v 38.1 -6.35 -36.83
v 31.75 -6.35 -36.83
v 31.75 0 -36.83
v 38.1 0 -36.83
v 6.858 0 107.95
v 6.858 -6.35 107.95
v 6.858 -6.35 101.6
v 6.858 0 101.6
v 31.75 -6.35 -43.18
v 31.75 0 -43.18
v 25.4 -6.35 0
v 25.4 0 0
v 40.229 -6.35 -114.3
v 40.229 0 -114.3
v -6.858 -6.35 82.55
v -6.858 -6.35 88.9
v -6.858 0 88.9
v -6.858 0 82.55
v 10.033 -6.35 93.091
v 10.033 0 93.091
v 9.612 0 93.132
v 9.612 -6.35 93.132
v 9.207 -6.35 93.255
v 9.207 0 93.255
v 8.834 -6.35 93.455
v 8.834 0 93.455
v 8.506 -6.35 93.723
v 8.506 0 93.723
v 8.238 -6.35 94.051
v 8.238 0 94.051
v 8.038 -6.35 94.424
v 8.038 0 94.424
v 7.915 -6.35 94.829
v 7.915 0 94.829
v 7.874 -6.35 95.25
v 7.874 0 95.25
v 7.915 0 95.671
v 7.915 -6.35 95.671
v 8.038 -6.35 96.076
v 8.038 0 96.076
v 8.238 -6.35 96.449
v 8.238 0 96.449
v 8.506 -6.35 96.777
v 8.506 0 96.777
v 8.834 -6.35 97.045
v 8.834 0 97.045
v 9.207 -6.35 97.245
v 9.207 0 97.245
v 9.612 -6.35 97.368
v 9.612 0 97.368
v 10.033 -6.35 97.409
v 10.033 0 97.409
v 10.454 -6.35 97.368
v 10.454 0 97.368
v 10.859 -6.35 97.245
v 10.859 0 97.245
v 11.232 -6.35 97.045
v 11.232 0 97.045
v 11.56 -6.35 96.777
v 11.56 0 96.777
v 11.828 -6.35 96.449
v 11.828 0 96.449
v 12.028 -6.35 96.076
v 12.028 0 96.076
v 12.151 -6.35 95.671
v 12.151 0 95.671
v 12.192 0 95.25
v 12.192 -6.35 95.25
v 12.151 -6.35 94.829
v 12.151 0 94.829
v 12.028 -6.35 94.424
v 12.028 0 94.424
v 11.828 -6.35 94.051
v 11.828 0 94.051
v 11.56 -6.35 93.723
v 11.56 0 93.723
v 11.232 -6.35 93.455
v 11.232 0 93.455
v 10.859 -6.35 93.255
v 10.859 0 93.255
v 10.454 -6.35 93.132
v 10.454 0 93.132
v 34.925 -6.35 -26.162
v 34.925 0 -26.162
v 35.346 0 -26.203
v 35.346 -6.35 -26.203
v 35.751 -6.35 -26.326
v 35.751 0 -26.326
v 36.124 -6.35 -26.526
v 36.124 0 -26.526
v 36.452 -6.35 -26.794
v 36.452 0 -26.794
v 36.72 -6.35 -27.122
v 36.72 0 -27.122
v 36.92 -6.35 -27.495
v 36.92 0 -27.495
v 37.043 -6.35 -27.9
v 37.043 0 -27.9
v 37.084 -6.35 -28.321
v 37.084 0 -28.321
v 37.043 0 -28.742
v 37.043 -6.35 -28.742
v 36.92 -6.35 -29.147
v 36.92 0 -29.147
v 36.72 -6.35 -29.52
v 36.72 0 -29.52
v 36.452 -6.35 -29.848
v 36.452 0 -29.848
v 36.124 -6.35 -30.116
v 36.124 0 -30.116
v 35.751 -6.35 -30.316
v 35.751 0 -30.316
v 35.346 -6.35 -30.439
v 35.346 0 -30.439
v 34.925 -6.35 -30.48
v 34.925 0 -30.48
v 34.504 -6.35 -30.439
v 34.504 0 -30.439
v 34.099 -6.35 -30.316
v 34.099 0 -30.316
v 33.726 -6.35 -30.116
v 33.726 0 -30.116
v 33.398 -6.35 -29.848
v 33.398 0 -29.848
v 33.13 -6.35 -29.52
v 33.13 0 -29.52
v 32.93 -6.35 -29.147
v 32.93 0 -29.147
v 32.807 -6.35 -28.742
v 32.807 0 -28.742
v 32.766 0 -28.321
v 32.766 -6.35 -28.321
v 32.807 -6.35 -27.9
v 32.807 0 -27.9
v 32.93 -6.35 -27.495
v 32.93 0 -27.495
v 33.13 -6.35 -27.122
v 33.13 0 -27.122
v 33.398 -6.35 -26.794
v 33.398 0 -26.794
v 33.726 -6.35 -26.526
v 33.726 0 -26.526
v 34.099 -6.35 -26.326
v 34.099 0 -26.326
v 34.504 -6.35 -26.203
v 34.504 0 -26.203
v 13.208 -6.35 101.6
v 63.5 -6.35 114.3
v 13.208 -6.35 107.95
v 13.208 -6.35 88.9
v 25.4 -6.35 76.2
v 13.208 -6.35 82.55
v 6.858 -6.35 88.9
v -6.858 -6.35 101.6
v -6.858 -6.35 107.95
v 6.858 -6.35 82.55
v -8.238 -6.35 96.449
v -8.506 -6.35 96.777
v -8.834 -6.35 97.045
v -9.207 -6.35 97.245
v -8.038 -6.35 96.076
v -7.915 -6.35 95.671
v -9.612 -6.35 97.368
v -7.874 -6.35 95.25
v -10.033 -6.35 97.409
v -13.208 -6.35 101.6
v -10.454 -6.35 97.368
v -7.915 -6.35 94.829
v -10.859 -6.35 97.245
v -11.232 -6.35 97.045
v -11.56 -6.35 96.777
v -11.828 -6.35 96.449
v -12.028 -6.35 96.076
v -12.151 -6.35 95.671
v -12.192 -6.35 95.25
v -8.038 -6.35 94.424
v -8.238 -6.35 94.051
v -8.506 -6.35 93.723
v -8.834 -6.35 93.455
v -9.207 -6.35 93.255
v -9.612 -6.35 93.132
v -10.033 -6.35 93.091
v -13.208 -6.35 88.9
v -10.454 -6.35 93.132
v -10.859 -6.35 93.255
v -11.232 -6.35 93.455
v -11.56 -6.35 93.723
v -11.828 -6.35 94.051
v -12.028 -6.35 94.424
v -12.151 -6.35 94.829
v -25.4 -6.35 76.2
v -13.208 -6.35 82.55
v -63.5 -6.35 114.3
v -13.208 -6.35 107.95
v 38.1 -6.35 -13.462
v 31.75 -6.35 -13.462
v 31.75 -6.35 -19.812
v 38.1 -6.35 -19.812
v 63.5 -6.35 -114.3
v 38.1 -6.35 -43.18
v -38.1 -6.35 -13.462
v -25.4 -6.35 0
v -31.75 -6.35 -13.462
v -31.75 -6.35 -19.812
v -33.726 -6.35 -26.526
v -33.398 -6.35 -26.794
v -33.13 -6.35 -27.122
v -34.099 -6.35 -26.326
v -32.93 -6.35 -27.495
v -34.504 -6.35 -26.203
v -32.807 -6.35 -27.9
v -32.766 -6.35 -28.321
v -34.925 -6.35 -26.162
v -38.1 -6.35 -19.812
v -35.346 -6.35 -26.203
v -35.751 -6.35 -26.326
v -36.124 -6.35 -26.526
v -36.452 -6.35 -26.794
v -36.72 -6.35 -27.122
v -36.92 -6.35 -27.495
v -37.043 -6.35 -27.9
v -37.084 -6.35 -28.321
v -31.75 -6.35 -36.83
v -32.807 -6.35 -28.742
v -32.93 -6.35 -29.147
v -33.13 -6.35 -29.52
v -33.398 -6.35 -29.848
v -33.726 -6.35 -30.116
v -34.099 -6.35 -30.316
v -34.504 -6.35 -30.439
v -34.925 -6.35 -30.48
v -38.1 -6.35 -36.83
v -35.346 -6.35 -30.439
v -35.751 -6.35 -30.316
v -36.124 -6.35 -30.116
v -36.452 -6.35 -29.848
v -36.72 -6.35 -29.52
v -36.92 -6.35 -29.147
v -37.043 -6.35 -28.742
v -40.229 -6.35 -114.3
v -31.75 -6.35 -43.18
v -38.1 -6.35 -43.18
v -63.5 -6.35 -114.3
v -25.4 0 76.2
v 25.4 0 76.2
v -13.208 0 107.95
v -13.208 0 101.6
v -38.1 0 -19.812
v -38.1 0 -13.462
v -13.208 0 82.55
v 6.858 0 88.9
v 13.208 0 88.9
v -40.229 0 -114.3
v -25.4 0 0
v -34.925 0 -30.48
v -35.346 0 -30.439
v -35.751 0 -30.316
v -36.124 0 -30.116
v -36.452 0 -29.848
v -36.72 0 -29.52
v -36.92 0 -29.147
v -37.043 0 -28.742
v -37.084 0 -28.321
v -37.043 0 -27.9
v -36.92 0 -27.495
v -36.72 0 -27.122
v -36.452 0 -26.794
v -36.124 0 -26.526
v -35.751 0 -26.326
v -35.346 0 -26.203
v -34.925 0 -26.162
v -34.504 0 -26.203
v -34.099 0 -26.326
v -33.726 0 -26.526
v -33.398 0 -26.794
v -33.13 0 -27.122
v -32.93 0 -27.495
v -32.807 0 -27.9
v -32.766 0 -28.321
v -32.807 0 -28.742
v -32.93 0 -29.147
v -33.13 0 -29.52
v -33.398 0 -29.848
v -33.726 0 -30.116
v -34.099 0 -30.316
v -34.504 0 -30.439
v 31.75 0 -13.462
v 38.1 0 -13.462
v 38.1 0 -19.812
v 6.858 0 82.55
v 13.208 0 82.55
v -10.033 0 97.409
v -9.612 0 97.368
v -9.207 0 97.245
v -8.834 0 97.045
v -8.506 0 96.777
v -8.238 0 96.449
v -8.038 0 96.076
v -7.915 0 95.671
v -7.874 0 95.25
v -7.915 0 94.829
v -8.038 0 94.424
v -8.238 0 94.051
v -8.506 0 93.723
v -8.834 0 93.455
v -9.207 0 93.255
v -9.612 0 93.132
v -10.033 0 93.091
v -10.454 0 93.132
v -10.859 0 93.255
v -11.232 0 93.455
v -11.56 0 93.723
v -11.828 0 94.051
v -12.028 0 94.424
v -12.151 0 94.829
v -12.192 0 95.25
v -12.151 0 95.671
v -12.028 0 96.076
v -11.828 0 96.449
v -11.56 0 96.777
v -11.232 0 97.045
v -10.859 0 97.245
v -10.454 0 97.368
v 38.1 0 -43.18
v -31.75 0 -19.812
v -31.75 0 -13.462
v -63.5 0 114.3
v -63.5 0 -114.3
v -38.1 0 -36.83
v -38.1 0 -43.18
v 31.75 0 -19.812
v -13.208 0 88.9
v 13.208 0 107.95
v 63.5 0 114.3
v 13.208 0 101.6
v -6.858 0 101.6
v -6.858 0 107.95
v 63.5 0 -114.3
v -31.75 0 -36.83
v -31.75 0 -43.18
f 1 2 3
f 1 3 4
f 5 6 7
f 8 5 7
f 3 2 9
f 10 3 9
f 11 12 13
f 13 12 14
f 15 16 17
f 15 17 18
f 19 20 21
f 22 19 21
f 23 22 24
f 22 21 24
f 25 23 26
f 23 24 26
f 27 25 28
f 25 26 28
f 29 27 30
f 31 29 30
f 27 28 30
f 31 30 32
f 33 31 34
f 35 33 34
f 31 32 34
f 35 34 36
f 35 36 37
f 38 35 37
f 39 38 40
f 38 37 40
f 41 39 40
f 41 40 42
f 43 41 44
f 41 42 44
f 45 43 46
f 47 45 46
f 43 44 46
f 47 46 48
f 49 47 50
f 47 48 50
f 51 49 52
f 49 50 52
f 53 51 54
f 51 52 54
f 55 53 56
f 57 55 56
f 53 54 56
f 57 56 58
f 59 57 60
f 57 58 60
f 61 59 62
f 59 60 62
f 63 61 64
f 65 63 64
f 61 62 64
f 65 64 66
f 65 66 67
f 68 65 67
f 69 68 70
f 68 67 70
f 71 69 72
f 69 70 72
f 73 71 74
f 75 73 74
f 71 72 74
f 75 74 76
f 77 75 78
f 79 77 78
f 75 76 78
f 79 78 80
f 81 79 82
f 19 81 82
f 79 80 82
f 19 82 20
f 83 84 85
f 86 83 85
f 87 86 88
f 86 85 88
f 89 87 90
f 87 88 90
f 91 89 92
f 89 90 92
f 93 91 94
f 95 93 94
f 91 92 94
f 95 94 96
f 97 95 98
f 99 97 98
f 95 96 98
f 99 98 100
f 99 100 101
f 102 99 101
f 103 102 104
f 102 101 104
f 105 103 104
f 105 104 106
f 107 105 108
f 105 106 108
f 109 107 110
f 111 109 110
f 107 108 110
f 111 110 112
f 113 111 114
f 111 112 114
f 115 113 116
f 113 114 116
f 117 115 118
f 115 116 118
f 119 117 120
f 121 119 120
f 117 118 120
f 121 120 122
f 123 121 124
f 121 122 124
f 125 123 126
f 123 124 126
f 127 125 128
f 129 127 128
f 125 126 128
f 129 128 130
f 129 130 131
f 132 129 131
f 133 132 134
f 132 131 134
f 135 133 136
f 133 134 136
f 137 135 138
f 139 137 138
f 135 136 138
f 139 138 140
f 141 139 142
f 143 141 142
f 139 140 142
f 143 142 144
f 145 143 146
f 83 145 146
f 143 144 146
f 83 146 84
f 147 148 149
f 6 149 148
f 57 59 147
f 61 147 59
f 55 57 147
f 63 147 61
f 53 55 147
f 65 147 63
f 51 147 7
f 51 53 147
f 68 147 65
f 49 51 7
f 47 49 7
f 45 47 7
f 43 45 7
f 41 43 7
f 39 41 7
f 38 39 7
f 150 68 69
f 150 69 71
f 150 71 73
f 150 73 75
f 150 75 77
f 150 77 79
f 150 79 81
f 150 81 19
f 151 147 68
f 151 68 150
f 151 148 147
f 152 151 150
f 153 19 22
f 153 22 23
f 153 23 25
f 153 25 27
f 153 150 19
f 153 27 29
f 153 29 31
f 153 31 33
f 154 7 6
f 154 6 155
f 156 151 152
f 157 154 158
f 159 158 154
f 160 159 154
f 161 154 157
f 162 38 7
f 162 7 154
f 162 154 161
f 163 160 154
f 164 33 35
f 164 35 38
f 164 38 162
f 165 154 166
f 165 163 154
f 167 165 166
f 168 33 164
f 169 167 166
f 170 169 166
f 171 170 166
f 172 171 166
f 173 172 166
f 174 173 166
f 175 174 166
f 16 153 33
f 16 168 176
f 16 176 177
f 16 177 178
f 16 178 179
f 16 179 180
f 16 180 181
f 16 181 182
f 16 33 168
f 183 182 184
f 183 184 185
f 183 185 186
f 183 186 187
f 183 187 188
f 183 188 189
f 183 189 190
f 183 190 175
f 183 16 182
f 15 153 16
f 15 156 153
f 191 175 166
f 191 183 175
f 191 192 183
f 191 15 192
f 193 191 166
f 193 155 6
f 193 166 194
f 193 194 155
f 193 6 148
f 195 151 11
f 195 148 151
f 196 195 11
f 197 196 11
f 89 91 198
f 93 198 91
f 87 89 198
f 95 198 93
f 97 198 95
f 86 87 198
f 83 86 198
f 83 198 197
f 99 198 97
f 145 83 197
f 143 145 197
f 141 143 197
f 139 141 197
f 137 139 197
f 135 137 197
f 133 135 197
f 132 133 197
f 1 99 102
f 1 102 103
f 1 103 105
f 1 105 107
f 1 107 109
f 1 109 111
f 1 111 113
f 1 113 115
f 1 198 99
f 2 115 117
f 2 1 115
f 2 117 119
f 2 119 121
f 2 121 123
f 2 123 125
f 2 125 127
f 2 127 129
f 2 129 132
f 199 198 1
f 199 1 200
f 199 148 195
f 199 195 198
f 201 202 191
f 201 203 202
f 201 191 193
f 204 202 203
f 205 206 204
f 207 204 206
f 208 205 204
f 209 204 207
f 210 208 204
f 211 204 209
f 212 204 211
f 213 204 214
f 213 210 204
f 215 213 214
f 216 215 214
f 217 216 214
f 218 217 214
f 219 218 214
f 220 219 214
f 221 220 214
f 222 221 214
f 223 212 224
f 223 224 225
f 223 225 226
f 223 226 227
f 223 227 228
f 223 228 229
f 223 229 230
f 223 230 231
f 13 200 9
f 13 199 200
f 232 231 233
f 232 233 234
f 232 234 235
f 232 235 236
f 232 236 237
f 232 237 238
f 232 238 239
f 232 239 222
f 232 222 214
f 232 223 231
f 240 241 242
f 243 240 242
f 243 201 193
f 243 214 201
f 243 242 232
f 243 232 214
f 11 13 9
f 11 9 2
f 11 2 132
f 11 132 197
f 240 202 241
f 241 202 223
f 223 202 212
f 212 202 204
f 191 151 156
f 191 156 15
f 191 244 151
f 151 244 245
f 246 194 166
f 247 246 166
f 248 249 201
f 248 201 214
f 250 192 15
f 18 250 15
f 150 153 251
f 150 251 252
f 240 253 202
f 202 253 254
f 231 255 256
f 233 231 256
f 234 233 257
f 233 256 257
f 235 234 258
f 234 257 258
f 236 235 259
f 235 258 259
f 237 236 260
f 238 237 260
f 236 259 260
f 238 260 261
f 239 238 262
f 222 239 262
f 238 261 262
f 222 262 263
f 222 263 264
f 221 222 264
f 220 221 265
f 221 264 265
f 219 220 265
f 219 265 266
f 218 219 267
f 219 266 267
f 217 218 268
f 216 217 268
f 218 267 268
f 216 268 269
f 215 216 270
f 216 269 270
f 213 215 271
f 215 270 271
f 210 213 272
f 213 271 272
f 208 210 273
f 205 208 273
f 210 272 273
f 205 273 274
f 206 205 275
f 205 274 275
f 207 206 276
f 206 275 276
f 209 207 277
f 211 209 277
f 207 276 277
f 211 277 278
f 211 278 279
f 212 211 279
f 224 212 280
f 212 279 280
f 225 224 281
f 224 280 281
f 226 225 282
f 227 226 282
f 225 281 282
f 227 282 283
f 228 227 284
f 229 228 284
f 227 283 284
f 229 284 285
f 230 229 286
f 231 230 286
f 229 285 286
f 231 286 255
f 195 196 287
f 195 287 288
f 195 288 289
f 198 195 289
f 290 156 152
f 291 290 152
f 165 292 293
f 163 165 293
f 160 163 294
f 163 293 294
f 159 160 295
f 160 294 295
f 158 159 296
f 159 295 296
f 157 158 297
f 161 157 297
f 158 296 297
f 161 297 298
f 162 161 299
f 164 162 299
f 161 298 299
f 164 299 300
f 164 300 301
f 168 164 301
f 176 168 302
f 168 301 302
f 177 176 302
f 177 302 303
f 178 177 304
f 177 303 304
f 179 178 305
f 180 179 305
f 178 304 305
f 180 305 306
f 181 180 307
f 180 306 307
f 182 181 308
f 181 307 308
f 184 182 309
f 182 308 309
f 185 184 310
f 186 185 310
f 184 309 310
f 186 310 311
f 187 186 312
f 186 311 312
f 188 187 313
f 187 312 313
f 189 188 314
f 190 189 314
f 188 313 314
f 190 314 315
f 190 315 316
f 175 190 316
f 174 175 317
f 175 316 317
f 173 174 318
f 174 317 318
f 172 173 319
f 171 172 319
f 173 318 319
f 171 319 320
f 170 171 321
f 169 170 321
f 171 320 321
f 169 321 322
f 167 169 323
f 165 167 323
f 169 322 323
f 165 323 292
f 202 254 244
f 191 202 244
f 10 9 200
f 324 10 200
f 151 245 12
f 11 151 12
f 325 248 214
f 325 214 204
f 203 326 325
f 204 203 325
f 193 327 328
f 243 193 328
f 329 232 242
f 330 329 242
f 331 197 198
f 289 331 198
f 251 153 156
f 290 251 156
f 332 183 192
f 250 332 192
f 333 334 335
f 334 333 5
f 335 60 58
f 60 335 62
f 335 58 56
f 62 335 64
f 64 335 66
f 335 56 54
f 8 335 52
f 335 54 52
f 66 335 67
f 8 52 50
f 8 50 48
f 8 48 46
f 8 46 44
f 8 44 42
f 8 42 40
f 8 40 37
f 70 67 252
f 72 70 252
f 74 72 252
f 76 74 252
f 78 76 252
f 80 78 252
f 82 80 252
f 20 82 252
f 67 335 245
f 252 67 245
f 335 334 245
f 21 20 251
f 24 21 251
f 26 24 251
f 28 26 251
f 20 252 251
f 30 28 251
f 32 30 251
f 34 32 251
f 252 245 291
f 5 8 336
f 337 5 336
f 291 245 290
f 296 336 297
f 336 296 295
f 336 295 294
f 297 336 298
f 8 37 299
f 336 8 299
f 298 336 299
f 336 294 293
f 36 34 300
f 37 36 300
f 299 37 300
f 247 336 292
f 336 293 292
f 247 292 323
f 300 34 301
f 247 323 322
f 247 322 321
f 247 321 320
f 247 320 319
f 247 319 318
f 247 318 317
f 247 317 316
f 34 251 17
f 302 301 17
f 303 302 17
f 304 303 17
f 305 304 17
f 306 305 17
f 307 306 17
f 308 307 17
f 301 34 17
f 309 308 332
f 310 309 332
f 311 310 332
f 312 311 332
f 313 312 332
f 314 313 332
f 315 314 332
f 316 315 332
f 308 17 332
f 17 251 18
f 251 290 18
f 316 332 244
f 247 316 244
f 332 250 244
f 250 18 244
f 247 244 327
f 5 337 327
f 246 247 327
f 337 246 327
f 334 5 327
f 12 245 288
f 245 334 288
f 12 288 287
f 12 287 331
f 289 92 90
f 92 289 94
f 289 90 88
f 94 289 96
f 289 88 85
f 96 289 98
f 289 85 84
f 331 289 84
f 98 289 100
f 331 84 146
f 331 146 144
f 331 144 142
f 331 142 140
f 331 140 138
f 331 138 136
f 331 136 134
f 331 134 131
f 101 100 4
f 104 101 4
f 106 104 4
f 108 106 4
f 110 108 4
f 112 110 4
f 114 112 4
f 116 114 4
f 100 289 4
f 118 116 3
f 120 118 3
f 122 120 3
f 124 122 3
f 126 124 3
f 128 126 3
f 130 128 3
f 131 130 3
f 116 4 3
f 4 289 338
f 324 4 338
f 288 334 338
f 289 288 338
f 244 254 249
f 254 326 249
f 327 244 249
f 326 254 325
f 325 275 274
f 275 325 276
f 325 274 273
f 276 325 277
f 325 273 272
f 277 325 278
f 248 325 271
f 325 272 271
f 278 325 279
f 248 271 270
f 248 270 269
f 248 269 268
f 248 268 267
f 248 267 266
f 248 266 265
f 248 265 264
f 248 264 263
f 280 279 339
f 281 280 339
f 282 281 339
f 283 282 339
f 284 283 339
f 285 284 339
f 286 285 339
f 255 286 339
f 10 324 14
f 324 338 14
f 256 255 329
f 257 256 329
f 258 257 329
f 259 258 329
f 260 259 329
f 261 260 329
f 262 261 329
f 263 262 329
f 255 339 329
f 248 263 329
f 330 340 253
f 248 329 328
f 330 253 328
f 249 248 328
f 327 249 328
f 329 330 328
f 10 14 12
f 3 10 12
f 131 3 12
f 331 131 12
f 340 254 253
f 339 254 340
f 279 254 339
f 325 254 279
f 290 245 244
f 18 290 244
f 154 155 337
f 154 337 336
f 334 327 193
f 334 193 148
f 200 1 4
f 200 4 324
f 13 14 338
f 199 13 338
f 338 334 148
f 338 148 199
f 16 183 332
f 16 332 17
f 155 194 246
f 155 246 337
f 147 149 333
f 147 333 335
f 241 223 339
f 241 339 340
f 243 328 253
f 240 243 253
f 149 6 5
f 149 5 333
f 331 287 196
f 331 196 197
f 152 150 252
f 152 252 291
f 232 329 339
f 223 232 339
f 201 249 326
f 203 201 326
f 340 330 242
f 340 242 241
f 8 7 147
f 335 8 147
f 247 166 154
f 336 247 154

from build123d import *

# Parameters (mm, degrees)
BOTTOM_PLATE_R      = 2.159
BOTTOM_PLATE_R_2    = 2.794
BOTTOM_PLATE_W      = 25.4
BOTTOM_PLATE_H      = 101.6
BOTTOM_PLATE_W_2    = 6.35
BOTTOM_PLATE_H_2    = 6.35
BOSS_EXTRUDE1_DEPTH = 6.35
SKETCH1_W           = 508
SKETCH1_H           = 508
SKETCH1_W_2         = 127
SKETCH1_H_2         = 228.6
CUT_EXTRUDE1_DEPTH  = 25.4


with BuildPart() as part:
    # Bottom Plate → Boss-Extrude1 (new body)
    # profile 1 of 3: a face of its own
    with BuildSketch(Plane(origin=(0, 0, 0), x_dir=(1, 0, 0), z_dir=(0, 1, 0))):
        with BuildLine():
            Line((25.4, 0), (47.625, 171.302946195))
            ThreePointArc((47.625, 171.302946195), (0, -177.8), (-47.625, 171.302946195))
            Line((-47.625, 171.302946195), (-25.4, 0))
            Line((-25.4, 0), (-25.4, -76.2))
            Line((-25.4, -76.2), (25.4, -76.2))
            Line((25.4, -76.2), (25.4, 0))
        make_face()
        with Locations((128.515324336, 72.009)):
            Circle(BOTTOM_PLATE_R, mode=Mode.SUBTRACT)
        with Locations((128.515324336, -72.009)):
            Circle(BOTTOM_PLATE_R, mode=Mode.SUBTRACT)
        with Locations((54.082553747, 147.04477289)):
            Circle(BOTTOM_PLATE_R, mode=Mode.SUBTRACT)
        with Locations(Location((34.925, 28.321, 0), (0, 0, 270))):
            Circle(BOTTOM_PLATE_R, mode=Mode.SUBTRACT)
        with Locations(Location((-10.033, -95.25, 0), (0, 0, 270))):
            Circle(BOTTOM_PLATE_R, mode=Mode.SUBTRACT)
        with Locations((27.813, -127)):
            Circle(BOTTOM_PLATE_R_2, mode=Mode.SUBTRACT)
        with Locations((-27.813, -127)):
            Circle(BOTTOM_PLATE_R_2, mode=Mode.SUBTRACT)
        with Locations(Location((10.033, -95.25, 0), (0, 0, 90))):
            Circle(BOTTOM_PLATE_R, mode=Mode.SUBTRACT)
        with Locations(Location((-34.925, 28.321, 0), (0, 0, 90))):
            Circle(BOTTOM_PLATE_R, mode=Mode.SUBTRACT)
        with Locations((-128.515324336, -72.009)):
            Circle(BOTTOM_PLATE_R, mode=Mode.SUBTRACT)
        with Locations((-128.515324336, 72.009)):
            Circle(BOTTOM_PLATE_R, mode=Mode.SUBTRACT)
        with Locations((-54.082553747, 147.04477289)):
            Circle(BOTTOM_PLATE_R, mode=Mode.SUBTRACT)
        with Locations((144.390324336, 0)):
            Rectangle(BOTTOM_PLATE_W, BOTTOM_PLATE_H, mode=Mode.SUBTRACT)
        with Locations((-34.925, 40.005)):
            Rectangle(BOTTOM_PLATE_W_2, BOTTOM_PLATE_H_2, mode=Mode.SUBTRACT)
        with Locations((34.925, 16.637)):
            Rectangle(BOTTOM_PLATE_W_2, BOTTOM_PLATE_H_2, mode=Mode.SUBTRACT)
        with Locations((34.925, 40.005)):
            Rectangle(BOTTOM_PLATE_W_2, BOTTOM_PLATE_H_2, mode=Mode.SUBTRACT)
        with Locations((128.515324336, -60.325)):
            Rectangle(BOTTOM_PLATE_W_2, BOTTOM_PLATE_H_2, mode=Mode.SUBTRACT)
        with Locations((128.515324336, 60.325)):
            Rectangle(BOTTOM_PLATE_W_2, BOTTOM_PLATE_H_2, mode=Mode.SUBTRACT)
        with Locations((-34.925, 16.637)):
            Rectangle(BOTTOM_PLATE_W_2, BOTTOM_PLATE_H_2, mode=Mode.SUBTRACT)
        with Locations((-10.033, -85.725)):
            Rectangle(BOTTOM_PLATE_W_2, BOTTOM_PLATE_H_2, mode=Mode.SUBTRACT)
        with Locations((-10.033, -104.775)):
            Rectangle(BOTTOM_PLATE_W_2, BOTTOM_PLATE_H_2, mode=Mode.SUBTRACT)
        with Locations((10.033, -104.775)):
            Rectangle(BOTTOM_PLATE_W_2, BOTTOM_PLATE_H_2, mode=Mode.SUBTRACT)
        with Locations((10.033, -85.725)):
            Rectangle(BOTTOM_PLATE_W_2, BOTTOM_PLATE_H_2, mode=Mode.SUBTRACT)
        with Locations((-144.390324336, 0)):
            Rectangle(BOTTOM_PLATE_W, BOTTOM_PLATE_H, mode=Mode.SUBTRACT)
        with Locations((-128.515324336, -60.325)):
            Rectangle(BOTTOM_PLATE_W_2, BOTTOM_PLATE_H_2, mode=Mode.SUBTRACT)
        with Locations((-128.515324336, 60.325)):
            Rectangle(BOTTOM_PLATE_W_2, BOTTOM_PLATE_H_2, mode=Mode.SUBTRACT)
    # profile 2 of 3: a face of its own
    with BuildSketch(Plane(origin=(0, 0, 0), x_dir=(1, 0, 0), z_dir=(0, 1, 0))):
        Polygon((52.518937038, 159.669886307), (58.816158581, 158.852879058), (59.63316583, 165.1501006), (53.335944287, 165.967107849), align=None)
    # profile 3 of 3: a face of its own
    with BuildSketch(Plane(origin=(0, 0, 0), x_dir=(1, 0, 0), z_dir=(0, 1, 0))):
        Polygon((-58.816158581, 158.852879058), (-59.63316583, 165.1501006), (-53.335944287, 165.967107849), (-52.518937038, 159.669886307), align=None)
    extrude(amount=-BOSS_EXTRUDE1_DEPTH)

    # Sketch1 → Cut-Extrude1 (cut)
    with BuildSketch(Plane(origin=(0, 0, 0), x_dir=(1, 0, 0), z_dir=(0, 1, 0))):
        Rectangle(SKETCH1_W, SKETCH1_H)
        Rectangle(SKETCH1_W_2, SKETCH1_H_2, mode=Mode.SUBTRACT)
    extrude(amount=-CUT_EXTRUDE1_DEPTH, mode=Mode.SUBTRACT)


solid = part.part
